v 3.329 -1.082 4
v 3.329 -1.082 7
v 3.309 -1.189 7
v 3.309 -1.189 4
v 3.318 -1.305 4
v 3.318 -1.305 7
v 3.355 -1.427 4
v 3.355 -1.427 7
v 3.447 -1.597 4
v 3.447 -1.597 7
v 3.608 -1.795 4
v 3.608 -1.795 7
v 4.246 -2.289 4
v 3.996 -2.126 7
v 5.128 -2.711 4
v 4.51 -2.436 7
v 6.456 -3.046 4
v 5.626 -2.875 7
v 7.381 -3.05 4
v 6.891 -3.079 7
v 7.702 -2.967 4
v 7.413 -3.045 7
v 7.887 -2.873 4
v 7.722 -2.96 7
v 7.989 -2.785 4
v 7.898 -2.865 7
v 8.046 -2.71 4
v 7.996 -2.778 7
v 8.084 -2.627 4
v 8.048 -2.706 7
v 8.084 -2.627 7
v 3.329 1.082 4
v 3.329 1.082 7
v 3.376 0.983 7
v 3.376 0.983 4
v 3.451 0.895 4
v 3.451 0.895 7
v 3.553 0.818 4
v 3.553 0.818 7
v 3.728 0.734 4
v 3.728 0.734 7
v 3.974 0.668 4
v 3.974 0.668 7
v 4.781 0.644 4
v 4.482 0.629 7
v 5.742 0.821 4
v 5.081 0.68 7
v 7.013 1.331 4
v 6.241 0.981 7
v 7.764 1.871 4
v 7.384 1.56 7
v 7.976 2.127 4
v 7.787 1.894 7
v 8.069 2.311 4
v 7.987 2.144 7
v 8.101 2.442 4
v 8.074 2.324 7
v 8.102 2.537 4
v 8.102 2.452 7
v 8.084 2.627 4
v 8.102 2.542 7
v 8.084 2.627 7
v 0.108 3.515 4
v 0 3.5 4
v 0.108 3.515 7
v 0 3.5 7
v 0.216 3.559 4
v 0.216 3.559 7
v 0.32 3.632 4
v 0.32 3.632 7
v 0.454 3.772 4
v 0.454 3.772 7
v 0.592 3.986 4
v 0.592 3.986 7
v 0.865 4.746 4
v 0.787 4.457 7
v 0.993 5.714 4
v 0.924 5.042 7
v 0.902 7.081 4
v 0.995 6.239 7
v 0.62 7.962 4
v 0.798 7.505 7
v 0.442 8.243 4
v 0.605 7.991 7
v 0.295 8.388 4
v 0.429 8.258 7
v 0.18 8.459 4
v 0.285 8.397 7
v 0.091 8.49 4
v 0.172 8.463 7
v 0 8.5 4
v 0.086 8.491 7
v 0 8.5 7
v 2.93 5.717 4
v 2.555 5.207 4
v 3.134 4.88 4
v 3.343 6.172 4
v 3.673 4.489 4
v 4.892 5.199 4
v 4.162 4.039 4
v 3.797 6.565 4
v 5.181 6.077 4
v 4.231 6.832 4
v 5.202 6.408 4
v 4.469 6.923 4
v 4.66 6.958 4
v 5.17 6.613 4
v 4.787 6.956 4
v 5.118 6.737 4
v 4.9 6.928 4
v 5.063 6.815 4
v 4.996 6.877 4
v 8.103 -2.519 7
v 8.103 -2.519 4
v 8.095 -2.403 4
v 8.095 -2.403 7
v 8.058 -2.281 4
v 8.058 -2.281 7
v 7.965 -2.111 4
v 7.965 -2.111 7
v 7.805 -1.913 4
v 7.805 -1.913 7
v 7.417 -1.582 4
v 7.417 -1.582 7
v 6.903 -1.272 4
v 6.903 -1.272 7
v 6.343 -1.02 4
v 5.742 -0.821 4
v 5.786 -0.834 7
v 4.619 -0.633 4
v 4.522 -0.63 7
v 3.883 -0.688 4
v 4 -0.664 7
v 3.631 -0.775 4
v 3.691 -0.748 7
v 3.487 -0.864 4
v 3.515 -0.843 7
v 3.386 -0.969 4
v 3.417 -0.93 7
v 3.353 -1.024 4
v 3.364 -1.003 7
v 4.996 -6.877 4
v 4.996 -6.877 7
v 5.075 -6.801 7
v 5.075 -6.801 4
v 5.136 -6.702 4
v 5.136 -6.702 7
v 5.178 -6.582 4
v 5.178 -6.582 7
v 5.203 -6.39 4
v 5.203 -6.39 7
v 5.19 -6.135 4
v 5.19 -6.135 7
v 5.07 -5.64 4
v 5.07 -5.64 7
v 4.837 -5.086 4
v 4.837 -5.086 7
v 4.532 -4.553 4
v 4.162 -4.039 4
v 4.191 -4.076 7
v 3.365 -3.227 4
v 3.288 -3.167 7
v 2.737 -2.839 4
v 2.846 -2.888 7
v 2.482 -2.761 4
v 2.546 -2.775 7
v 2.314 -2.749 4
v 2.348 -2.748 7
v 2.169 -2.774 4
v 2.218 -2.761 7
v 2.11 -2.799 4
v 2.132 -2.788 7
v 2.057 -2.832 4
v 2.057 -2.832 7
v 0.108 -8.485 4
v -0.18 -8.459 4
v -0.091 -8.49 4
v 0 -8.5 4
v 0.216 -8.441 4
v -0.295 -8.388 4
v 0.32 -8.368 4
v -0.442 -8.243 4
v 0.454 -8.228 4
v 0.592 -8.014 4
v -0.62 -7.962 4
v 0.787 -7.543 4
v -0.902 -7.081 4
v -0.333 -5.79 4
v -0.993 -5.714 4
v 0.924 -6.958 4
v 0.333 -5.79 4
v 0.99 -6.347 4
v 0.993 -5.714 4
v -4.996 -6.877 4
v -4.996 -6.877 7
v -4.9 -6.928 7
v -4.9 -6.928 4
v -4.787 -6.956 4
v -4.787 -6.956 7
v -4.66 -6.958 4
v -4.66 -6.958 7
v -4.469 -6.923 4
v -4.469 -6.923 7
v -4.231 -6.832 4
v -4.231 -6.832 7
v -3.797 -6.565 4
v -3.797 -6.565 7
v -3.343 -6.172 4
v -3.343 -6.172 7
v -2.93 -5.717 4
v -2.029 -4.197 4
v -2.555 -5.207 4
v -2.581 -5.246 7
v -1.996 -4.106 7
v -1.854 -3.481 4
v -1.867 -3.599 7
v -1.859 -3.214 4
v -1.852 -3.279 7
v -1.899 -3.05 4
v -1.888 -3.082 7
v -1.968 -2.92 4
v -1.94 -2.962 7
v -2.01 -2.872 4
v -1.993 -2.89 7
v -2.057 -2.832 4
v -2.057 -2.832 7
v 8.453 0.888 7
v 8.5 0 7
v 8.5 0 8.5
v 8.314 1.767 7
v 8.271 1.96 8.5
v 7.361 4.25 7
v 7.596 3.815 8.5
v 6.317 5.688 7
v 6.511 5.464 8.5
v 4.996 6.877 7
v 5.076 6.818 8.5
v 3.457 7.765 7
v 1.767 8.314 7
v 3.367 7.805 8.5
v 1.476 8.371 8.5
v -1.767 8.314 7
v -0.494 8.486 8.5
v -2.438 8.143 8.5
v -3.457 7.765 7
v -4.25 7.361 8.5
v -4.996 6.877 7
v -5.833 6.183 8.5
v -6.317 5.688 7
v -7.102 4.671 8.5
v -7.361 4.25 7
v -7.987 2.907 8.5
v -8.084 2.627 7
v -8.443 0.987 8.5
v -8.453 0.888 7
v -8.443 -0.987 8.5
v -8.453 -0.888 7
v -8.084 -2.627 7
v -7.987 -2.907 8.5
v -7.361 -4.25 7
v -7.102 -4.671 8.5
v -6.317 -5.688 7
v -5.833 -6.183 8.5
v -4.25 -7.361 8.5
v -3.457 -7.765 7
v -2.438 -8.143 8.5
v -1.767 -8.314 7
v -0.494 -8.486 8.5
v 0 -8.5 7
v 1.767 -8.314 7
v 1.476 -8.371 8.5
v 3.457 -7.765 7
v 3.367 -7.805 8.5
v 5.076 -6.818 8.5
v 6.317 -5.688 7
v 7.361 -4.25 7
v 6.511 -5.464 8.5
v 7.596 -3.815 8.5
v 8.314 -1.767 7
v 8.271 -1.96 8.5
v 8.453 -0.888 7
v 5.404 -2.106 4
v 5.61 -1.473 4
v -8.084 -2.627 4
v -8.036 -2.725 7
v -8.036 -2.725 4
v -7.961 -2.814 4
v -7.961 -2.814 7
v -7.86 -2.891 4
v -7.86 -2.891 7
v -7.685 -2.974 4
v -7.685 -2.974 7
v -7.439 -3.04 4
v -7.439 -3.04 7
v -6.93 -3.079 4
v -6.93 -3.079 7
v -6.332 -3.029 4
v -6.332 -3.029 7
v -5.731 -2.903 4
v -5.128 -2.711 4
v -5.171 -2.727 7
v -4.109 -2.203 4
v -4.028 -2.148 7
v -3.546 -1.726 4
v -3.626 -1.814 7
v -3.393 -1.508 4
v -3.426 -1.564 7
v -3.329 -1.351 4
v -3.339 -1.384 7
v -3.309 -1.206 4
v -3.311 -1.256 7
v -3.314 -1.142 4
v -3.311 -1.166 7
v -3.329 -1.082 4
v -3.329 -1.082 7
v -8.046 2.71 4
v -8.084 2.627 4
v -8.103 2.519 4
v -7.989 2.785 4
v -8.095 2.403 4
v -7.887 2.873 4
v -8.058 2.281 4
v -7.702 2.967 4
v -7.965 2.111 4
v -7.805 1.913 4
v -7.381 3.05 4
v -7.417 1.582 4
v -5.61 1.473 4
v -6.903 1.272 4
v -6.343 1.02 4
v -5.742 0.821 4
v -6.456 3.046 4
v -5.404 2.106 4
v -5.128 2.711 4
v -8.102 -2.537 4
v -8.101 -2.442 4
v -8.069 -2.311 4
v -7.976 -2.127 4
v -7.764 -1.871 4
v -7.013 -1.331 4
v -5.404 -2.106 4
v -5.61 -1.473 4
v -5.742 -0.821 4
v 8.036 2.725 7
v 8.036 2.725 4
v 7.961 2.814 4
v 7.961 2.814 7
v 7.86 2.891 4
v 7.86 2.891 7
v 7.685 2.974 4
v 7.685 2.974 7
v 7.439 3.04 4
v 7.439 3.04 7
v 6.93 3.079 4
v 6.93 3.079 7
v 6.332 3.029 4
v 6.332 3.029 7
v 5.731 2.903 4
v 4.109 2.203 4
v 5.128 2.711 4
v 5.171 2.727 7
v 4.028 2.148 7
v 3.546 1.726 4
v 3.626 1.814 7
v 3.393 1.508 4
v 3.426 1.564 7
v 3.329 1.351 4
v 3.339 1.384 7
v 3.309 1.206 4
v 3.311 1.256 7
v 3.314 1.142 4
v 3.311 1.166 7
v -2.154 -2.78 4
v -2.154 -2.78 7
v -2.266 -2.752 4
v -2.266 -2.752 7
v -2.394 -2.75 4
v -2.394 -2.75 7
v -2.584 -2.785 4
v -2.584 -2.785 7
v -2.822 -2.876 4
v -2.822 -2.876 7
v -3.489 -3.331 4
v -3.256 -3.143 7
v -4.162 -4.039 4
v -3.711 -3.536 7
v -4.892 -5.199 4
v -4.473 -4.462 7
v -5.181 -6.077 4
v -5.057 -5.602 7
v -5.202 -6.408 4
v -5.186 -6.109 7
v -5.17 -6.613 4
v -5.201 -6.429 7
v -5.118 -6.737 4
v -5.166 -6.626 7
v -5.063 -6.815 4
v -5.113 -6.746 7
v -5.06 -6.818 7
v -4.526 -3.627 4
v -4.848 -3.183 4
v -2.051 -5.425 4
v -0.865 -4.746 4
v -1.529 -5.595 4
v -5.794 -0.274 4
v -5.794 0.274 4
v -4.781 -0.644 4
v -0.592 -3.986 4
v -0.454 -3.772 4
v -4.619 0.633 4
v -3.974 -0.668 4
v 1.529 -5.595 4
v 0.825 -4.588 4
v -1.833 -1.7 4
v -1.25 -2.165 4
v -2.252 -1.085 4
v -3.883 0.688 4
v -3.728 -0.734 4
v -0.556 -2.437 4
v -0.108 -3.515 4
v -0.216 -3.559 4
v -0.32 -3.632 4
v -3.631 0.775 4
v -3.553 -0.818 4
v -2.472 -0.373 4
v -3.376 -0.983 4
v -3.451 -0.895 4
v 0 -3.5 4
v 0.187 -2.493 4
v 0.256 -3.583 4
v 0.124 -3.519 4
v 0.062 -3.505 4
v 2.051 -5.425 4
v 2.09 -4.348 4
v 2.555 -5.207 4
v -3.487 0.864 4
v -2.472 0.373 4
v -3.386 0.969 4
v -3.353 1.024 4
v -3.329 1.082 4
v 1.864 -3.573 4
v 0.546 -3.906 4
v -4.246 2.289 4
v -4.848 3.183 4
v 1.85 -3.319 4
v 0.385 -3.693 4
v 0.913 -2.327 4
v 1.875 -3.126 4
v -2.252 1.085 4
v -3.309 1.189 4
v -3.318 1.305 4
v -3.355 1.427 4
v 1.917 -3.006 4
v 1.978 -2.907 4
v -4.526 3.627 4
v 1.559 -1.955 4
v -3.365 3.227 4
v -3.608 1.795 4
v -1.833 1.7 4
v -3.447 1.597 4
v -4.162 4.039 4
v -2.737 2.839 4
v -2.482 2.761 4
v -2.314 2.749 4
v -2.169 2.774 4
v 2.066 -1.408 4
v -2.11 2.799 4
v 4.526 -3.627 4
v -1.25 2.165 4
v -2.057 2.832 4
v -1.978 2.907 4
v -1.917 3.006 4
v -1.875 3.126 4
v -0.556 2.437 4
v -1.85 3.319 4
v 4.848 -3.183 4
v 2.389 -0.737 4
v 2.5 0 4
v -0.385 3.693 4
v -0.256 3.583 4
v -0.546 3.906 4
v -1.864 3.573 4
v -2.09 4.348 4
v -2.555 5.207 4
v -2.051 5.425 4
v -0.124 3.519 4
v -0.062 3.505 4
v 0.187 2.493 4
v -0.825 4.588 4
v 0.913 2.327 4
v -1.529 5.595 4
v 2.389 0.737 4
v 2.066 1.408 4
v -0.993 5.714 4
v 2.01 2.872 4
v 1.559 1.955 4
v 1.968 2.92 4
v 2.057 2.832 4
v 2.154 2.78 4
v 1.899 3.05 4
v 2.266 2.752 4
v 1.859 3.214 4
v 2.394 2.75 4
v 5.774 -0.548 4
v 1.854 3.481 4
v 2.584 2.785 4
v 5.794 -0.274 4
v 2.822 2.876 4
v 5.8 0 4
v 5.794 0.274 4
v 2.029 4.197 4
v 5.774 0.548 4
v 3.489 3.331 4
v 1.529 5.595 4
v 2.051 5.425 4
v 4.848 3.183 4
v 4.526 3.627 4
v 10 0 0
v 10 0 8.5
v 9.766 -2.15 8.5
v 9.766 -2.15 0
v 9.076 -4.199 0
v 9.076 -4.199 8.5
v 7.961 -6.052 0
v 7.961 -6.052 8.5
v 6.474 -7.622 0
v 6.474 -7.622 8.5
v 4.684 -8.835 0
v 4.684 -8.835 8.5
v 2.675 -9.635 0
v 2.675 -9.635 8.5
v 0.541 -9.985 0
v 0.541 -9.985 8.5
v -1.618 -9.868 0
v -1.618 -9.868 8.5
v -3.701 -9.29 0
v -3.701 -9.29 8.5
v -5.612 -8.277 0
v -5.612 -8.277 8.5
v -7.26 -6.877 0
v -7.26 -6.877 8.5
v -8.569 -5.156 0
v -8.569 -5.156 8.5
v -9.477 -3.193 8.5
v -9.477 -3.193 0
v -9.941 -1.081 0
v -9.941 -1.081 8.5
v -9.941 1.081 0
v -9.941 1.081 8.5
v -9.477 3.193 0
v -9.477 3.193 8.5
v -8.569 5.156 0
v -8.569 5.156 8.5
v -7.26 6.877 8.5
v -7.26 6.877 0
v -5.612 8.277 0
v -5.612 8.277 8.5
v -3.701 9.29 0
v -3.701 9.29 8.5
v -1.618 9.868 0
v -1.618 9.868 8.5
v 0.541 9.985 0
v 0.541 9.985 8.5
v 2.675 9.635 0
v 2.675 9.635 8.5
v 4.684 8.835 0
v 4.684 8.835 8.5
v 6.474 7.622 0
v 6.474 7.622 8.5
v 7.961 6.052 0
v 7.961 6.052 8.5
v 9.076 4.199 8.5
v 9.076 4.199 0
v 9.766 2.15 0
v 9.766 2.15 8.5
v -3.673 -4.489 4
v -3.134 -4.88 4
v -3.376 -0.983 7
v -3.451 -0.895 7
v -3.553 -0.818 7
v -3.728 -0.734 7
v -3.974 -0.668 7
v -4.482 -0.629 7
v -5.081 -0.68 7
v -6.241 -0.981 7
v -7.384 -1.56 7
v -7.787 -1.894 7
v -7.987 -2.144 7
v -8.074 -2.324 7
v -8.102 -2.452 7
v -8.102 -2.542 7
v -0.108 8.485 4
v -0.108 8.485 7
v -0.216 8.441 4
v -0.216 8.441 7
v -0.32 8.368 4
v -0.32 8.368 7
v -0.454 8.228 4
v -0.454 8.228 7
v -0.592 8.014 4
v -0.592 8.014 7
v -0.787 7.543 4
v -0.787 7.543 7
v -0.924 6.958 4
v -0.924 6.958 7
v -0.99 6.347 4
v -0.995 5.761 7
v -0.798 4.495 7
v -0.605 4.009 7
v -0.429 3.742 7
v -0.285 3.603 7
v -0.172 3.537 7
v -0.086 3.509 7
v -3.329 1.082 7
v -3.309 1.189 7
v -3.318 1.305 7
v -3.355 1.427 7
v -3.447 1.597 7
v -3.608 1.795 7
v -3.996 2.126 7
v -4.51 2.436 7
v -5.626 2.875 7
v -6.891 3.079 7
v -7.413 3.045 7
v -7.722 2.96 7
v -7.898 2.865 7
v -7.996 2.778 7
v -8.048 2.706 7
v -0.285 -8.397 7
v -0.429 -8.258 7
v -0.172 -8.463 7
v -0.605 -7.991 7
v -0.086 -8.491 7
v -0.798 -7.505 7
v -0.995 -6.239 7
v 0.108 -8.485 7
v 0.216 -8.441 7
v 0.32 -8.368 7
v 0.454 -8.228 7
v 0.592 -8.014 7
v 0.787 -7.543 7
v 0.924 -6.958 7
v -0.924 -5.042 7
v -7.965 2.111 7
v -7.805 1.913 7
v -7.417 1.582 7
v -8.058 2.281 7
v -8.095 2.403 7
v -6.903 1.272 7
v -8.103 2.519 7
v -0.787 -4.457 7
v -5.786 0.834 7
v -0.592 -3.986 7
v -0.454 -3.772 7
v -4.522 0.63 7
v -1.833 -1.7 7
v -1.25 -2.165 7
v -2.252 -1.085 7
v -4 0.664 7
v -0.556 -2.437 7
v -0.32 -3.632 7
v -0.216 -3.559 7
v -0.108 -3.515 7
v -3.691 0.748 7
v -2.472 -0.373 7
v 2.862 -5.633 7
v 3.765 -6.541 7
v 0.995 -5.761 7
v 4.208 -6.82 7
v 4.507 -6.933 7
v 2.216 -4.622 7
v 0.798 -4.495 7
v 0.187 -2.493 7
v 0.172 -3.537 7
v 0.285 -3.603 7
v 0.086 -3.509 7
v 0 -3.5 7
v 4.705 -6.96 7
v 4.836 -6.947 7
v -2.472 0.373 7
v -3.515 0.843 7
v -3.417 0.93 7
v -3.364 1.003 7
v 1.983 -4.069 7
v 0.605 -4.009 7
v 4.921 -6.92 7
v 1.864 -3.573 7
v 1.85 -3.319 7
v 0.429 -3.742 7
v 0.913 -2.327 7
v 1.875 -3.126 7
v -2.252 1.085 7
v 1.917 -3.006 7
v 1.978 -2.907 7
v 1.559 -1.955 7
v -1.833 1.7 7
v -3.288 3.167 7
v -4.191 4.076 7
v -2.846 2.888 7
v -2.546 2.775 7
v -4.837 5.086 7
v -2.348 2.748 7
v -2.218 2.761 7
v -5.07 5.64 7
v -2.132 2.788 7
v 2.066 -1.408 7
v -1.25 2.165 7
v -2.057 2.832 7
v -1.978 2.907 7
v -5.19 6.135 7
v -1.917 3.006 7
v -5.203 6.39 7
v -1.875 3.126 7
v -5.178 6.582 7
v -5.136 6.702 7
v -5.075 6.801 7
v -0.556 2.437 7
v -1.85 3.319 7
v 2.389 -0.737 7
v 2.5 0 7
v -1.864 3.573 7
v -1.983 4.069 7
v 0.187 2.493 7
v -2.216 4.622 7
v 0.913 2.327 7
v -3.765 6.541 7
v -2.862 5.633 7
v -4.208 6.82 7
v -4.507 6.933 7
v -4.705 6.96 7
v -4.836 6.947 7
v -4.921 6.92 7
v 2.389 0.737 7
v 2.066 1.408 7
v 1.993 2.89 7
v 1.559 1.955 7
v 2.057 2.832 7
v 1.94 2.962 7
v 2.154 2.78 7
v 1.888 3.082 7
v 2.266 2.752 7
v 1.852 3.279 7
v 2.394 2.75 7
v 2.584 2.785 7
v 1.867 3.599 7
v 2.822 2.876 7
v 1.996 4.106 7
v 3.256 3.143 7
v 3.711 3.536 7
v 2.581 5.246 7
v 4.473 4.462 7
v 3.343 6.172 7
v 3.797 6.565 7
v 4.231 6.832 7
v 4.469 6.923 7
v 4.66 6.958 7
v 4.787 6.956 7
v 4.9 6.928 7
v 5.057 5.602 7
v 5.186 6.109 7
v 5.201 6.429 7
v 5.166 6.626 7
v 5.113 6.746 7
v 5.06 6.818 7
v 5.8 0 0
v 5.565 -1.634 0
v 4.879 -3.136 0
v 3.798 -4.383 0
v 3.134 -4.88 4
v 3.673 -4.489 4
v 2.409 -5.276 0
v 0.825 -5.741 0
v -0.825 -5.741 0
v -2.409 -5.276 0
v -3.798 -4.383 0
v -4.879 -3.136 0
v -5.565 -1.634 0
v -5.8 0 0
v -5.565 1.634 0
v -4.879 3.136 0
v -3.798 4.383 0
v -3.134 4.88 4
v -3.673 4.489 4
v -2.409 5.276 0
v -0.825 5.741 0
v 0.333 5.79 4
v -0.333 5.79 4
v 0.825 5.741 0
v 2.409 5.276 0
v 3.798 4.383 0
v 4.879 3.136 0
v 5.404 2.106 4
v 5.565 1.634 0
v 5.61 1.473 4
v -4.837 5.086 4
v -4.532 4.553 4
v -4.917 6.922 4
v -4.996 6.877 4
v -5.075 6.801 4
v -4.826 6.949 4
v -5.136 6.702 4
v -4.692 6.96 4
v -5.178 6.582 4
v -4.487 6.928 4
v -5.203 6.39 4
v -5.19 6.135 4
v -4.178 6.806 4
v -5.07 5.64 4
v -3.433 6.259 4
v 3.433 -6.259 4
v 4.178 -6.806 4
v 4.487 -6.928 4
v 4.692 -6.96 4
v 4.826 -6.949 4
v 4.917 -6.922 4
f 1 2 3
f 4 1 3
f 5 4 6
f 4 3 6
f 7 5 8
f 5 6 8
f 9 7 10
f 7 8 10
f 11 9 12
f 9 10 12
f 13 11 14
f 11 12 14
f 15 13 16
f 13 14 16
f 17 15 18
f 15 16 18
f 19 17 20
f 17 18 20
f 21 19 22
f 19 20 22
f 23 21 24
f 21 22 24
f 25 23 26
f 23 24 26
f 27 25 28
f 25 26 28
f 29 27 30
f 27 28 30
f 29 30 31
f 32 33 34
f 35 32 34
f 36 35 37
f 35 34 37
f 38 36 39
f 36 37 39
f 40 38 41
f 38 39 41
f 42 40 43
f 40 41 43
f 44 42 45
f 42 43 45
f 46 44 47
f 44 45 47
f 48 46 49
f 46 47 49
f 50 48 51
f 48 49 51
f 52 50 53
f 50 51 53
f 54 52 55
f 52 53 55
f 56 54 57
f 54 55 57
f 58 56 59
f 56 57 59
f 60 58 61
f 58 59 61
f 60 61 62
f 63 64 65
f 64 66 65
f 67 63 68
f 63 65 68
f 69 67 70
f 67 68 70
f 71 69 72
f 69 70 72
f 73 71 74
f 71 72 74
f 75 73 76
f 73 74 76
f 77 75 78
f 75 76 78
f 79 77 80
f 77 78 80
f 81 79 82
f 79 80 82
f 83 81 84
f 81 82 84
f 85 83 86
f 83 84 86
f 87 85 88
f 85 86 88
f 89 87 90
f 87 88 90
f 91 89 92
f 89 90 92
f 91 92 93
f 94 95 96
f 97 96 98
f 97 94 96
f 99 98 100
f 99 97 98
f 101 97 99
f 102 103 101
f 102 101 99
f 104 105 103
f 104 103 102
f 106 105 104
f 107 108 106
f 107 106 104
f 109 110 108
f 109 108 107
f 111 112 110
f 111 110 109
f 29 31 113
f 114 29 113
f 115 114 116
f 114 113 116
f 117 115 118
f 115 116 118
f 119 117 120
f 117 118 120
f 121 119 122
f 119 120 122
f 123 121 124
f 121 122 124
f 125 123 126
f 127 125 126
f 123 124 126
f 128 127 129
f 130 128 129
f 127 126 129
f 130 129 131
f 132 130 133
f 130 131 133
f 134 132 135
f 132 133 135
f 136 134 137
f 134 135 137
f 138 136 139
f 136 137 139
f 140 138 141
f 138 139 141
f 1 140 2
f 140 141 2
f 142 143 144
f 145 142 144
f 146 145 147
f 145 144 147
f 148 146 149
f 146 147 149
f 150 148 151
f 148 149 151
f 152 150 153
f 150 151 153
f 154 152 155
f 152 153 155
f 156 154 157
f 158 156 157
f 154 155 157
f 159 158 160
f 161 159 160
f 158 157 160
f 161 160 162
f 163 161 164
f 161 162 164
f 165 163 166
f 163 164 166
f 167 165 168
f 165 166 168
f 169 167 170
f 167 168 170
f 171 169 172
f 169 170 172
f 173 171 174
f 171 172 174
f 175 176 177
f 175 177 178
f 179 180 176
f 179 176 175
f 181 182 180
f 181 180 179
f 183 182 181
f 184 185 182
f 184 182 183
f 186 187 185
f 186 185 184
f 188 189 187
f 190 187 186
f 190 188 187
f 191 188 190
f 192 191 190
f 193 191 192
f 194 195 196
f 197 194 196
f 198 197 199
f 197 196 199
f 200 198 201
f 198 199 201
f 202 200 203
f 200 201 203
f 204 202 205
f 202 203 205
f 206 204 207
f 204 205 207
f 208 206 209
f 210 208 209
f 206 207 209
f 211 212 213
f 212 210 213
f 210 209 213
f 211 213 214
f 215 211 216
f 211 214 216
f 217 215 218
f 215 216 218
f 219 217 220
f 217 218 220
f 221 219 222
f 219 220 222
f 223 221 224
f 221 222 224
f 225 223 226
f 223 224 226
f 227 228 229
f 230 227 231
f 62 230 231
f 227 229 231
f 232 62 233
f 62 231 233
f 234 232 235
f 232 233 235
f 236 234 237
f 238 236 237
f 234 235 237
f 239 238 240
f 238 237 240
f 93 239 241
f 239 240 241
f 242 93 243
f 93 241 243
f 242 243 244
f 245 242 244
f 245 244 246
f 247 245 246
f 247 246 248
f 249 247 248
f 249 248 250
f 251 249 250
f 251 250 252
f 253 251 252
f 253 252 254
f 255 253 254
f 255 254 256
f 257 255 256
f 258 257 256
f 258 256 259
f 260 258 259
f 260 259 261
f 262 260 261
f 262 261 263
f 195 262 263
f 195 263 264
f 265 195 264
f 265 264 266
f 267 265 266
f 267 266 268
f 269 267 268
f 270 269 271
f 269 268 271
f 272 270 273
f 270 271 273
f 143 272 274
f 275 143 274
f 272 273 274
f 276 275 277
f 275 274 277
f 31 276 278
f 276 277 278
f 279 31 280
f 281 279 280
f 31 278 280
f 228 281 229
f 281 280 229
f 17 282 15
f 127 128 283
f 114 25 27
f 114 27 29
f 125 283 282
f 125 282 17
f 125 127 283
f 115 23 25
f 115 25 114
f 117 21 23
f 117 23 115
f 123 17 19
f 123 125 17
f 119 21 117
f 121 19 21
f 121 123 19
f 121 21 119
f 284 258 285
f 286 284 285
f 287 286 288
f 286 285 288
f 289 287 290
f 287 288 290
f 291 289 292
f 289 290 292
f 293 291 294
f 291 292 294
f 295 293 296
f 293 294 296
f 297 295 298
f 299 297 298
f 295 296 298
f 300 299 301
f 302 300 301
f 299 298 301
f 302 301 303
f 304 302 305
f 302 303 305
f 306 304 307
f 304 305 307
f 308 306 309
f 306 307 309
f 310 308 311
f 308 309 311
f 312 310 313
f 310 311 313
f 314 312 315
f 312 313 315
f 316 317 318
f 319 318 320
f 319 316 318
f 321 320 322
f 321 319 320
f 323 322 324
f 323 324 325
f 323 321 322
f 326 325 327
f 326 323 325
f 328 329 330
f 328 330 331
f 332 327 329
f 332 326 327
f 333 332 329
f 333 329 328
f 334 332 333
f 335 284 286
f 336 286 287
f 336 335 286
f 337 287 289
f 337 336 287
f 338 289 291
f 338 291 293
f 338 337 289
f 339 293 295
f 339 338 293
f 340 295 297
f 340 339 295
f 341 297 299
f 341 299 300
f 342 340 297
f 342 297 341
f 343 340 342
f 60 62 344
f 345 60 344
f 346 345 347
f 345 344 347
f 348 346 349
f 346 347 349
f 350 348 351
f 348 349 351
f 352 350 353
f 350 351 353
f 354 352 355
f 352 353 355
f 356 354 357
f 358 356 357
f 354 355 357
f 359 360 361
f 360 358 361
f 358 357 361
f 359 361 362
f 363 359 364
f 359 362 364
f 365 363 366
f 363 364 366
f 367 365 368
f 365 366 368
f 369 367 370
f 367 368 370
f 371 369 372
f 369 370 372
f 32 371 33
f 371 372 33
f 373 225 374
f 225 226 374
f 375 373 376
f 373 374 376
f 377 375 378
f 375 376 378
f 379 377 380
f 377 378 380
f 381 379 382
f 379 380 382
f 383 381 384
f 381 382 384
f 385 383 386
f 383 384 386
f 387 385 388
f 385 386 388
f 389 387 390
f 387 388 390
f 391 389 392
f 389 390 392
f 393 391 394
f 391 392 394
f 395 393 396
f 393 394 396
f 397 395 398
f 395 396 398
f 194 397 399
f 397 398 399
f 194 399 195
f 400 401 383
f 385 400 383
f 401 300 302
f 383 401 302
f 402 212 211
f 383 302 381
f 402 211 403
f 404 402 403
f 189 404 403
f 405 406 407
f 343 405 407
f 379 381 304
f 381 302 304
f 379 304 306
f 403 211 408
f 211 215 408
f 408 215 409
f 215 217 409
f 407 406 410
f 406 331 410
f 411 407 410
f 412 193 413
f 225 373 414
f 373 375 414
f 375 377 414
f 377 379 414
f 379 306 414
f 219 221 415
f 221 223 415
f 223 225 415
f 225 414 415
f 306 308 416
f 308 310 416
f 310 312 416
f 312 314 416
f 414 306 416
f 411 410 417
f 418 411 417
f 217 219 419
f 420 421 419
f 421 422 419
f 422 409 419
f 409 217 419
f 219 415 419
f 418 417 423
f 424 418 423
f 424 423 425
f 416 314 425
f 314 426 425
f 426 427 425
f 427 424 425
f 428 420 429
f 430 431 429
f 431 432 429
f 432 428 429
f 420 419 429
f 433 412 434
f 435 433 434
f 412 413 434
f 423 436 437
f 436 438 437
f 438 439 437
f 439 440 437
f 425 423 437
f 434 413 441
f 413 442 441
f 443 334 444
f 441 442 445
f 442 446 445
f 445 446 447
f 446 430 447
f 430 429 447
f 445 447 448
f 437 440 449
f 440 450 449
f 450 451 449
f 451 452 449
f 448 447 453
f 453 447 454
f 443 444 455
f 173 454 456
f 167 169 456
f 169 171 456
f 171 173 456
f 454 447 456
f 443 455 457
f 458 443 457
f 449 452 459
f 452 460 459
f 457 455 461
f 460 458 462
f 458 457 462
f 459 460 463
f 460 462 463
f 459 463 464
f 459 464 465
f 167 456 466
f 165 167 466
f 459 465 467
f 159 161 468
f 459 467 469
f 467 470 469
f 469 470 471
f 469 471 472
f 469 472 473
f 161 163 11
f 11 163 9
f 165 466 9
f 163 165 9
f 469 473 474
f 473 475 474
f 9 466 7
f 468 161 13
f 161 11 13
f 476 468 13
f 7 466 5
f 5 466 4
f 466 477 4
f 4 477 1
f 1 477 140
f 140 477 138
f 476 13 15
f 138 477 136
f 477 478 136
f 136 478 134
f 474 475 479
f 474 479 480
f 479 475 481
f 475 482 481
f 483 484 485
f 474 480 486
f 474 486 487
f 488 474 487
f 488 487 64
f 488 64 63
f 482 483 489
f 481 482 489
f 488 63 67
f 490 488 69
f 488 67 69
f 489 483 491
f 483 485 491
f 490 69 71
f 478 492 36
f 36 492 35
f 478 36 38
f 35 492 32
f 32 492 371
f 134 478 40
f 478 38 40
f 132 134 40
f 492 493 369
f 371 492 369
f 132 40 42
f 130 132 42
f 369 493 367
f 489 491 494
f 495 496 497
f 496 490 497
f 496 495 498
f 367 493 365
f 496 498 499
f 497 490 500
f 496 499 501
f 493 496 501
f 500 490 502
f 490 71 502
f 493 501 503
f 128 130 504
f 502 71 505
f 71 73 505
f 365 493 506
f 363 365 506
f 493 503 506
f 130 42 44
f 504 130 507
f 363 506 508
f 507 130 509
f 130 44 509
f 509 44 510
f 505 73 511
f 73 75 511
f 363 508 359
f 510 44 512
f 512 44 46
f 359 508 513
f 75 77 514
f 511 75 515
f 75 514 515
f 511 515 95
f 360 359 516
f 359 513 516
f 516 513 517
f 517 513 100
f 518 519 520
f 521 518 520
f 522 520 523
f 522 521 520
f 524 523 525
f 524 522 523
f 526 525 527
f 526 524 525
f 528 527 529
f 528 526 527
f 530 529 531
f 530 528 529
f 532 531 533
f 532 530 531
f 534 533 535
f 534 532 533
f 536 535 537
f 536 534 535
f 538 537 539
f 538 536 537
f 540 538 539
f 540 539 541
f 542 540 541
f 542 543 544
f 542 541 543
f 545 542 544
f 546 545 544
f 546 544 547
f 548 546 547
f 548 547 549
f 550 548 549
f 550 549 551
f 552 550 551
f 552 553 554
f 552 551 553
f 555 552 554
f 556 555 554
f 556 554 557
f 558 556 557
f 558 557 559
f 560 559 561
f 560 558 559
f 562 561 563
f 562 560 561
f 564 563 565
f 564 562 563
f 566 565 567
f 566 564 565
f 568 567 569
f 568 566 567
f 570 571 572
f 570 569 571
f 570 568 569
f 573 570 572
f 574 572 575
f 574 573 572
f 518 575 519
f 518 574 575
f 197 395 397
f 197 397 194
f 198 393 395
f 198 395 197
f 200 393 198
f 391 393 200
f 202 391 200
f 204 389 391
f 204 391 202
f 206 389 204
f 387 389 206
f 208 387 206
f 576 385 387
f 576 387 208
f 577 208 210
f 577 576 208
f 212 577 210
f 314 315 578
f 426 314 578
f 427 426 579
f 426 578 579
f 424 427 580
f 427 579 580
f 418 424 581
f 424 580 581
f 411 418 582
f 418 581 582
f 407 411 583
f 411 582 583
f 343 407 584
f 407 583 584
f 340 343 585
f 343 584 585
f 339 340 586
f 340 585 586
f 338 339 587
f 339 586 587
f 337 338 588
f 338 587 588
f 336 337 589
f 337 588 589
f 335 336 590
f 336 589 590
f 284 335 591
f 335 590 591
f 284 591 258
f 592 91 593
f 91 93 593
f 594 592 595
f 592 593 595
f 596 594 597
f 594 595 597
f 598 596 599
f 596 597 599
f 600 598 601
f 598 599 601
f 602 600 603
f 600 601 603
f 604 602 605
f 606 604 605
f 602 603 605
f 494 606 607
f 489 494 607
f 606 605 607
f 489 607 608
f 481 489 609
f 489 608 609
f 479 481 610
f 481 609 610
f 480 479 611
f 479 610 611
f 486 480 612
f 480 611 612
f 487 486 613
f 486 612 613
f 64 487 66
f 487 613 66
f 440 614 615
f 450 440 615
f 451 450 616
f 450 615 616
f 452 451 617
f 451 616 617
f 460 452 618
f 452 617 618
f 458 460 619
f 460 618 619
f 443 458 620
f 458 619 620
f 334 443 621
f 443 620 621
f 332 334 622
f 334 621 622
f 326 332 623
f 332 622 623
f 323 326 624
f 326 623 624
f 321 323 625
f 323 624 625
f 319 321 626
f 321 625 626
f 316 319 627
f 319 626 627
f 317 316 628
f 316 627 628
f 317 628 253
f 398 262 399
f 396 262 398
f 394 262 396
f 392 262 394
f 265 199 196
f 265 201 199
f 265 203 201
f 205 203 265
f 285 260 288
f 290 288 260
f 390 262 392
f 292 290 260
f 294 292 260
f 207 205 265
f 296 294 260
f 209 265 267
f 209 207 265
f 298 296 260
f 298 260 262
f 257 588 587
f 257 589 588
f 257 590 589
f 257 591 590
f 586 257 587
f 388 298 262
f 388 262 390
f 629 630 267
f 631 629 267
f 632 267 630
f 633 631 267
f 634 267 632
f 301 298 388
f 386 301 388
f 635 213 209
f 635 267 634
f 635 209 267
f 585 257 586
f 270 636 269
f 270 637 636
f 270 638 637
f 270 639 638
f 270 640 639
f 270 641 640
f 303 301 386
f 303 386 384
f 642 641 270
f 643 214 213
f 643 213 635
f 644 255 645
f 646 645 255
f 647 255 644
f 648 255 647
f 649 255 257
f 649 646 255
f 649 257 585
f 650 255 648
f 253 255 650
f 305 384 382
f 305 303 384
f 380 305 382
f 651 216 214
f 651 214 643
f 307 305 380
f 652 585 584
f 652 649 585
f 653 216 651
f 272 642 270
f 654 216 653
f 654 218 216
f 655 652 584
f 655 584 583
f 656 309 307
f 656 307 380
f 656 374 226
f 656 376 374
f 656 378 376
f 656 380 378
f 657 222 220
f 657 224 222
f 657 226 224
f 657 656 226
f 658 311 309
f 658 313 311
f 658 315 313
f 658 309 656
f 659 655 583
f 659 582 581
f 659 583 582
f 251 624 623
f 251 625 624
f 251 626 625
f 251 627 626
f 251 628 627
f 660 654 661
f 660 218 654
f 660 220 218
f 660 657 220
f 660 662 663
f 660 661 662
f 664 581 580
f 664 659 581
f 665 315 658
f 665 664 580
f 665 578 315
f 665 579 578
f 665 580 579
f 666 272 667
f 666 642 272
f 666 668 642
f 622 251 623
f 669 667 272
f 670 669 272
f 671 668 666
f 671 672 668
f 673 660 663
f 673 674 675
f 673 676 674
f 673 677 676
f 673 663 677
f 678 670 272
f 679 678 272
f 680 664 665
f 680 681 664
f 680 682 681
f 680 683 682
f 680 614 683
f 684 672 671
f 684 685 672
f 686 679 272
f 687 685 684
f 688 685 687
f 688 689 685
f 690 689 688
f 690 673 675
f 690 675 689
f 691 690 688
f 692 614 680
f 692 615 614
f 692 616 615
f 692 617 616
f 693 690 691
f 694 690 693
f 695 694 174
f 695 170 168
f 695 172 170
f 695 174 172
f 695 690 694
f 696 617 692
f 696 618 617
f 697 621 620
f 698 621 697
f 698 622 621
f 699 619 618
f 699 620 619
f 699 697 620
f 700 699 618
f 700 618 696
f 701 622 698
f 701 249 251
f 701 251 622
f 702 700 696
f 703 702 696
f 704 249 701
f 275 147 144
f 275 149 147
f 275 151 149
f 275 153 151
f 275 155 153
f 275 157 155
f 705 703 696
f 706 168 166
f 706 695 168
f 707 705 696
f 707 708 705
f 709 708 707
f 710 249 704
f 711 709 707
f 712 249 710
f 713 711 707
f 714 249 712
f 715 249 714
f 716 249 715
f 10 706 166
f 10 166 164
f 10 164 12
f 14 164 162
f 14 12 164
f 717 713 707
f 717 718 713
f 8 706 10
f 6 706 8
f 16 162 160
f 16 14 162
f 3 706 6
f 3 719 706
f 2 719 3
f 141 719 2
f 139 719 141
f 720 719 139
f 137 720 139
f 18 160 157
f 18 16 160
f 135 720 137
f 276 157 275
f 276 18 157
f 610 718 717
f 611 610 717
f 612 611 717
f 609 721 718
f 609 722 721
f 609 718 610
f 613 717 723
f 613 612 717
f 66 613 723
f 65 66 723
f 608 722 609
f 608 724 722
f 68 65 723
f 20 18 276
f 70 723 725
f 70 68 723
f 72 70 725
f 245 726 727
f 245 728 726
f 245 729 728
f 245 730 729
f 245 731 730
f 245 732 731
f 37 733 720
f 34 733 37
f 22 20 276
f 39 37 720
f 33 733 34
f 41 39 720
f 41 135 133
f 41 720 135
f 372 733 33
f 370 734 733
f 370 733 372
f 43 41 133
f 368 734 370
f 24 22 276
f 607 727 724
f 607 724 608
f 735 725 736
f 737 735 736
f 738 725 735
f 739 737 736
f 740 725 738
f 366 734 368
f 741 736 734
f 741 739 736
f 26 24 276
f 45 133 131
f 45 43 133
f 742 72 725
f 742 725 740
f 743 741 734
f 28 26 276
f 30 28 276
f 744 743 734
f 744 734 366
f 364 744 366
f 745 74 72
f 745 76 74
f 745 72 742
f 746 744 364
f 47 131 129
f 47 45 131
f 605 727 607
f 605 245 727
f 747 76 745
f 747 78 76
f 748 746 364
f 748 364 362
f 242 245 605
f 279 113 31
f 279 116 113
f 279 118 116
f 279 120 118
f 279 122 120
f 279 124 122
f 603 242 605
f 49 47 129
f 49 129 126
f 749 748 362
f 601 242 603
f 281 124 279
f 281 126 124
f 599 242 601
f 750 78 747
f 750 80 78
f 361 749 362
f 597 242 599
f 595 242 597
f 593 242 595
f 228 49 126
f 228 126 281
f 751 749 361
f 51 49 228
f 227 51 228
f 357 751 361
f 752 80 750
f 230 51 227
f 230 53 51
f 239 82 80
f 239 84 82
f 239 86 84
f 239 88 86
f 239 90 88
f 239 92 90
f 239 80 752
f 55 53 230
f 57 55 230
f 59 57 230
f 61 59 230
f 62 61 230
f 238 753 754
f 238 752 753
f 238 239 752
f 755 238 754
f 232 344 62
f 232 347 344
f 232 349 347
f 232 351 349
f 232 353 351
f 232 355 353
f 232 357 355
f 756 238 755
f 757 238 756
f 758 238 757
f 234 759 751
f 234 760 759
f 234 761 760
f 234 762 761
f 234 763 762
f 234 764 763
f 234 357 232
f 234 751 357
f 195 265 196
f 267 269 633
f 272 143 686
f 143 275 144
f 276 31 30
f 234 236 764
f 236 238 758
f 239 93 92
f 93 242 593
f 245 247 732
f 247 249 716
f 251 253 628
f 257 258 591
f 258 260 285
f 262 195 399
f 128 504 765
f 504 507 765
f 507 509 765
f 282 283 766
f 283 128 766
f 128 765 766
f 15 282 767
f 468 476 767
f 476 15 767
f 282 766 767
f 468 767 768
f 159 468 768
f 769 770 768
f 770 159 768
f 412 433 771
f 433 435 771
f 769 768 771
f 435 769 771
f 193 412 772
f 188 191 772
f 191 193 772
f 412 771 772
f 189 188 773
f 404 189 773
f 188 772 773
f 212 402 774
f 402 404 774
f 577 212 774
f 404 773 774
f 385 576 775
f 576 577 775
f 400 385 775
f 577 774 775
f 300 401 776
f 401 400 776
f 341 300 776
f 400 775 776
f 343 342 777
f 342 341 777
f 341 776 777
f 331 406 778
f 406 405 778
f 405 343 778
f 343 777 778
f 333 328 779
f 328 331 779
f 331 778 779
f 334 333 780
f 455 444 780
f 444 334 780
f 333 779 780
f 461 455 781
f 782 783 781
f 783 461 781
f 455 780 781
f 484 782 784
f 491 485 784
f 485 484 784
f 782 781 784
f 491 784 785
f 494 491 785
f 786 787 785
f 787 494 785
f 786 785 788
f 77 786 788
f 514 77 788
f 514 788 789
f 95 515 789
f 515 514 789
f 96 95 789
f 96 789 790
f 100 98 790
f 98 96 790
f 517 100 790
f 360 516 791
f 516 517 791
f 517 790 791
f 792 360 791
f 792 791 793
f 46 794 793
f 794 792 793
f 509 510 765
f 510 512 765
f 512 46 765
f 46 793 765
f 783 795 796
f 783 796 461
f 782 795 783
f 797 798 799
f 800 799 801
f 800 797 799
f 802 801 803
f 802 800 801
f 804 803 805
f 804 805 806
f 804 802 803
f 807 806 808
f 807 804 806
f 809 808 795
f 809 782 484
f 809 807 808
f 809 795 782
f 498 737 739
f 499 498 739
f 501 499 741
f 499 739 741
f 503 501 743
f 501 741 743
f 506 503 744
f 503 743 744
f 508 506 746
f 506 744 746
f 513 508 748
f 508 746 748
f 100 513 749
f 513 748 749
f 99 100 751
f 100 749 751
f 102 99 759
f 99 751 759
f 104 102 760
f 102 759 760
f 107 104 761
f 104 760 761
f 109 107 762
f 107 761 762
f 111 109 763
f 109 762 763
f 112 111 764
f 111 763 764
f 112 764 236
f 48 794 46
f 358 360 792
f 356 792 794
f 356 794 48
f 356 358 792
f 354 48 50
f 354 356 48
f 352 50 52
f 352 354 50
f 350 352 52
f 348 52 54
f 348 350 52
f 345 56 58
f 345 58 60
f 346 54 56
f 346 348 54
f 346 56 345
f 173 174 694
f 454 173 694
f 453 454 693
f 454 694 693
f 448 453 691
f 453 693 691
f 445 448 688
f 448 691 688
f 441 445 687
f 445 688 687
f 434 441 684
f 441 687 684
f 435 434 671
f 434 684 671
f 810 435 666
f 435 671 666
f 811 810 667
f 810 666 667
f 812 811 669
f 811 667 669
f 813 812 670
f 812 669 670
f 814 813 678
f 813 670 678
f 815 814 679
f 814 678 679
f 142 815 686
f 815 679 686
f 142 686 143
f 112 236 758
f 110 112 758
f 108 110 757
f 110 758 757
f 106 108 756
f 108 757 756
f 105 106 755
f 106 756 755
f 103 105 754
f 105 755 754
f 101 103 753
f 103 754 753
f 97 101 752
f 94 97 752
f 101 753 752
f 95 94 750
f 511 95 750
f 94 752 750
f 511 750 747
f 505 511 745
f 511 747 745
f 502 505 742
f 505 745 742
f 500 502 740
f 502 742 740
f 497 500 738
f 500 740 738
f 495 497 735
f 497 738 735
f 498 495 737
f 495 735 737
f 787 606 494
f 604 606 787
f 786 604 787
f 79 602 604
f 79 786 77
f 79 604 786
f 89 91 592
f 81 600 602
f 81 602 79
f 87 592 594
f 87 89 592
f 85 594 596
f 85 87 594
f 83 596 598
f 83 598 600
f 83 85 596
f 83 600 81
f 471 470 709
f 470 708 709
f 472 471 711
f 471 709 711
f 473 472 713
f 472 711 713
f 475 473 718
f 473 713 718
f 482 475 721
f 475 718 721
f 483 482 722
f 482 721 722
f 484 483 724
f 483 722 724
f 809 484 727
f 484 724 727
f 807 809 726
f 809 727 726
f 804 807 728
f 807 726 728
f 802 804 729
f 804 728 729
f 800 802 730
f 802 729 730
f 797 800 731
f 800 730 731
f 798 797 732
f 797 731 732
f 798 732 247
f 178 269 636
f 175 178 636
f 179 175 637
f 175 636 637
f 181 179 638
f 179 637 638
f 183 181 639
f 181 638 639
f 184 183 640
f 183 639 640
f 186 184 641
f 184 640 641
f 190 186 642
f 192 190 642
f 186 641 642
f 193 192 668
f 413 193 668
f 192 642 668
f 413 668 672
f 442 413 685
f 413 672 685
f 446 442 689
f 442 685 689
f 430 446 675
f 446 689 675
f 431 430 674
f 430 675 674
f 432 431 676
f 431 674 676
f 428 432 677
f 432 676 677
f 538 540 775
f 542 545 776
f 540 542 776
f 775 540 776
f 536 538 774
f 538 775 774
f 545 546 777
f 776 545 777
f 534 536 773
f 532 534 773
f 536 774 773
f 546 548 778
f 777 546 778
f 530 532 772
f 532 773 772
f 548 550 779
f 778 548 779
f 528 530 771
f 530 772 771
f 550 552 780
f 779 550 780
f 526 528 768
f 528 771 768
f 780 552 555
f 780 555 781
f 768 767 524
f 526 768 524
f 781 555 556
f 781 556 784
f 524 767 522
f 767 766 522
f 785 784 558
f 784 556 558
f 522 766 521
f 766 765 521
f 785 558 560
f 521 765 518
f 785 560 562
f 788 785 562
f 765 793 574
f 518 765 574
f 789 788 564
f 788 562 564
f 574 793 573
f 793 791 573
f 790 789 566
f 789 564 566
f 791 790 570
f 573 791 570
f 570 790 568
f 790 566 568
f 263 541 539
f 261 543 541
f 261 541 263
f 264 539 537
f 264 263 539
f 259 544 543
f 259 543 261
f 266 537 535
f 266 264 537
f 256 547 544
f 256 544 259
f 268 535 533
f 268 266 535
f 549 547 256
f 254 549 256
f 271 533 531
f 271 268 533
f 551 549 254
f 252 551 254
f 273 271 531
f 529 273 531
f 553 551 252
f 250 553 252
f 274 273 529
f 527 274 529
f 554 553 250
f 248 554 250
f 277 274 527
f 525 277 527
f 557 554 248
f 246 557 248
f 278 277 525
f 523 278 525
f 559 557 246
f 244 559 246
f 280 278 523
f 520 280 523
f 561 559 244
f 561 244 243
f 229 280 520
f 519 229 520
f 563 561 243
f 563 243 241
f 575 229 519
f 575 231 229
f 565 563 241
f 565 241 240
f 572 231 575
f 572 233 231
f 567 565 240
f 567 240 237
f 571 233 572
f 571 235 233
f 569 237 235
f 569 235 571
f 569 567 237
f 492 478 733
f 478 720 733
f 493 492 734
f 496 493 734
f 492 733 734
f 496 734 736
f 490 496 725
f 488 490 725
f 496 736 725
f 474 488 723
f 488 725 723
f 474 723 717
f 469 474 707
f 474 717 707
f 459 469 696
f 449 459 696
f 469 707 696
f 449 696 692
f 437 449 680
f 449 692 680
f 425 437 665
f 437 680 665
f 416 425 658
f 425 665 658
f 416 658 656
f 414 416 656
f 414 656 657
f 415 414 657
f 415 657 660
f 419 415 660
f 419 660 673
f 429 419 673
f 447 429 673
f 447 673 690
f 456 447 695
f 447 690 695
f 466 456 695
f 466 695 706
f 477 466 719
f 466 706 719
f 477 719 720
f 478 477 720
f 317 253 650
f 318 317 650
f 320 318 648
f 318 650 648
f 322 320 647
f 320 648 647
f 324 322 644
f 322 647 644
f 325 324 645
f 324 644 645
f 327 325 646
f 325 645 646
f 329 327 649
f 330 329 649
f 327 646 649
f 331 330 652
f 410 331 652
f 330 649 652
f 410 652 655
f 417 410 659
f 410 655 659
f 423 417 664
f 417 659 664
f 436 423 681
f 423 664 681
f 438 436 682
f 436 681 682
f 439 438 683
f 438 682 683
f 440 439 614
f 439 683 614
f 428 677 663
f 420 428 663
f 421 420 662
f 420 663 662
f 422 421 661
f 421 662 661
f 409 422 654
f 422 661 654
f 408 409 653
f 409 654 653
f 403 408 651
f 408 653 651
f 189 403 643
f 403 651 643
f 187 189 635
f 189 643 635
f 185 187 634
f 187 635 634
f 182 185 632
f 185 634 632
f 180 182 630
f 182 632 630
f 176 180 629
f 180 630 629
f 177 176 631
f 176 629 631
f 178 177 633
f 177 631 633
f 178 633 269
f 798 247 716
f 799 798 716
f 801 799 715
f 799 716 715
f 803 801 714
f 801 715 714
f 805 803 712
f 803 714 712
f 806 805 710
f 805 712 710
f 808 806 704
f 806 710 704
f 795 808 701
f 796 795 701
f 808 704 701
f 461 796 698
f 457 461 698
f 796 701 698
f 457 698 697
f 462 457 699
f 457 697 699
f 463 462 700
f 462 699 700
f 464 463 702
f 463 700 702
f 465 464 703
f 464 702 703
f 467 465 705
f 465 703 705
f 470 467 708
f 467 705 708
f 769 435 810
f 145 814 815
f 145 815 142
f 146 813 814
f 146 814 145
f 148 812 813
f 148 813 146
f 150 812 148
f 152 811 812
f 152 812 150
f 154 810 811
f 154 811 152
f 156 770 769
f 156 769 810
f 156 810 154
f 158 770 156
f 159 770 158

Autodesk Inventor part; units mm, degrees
ref_plane "YZ Plane" through (0, 0, 0) normal (1, 0, 0) x (0, 1, 0)
ref_plane "XZ Plane" through (0, 0, 0) normal (0, 1, 0) x (-1, 0, 0)
ref_plane "XY Plane" through (0, 0, 0) normal (0, 0, 1) x (1, 0, 0)
sketch "スケッチ1" plane through (0, 0, 0) normal (0, 0, 1) x (1, 0, 0)
  circle A0 centre (0, 0) radius 10
  circle A1 centre (0, 0) radius 5.8
  dimension "d0" = 20
  dimension "d1" = 11.6
extrude "押し出し1" add sketch "スケッチ1" along normal blind 8.5 contours A0 | A1
extrude "押し出し2" cut sketch "スケッチ1" along normal blind 4 contours A1
sketch "スケッチ2" plane through (0, 0, 8.5) normal (0, 0, 1) x (1, 0, 0)
  circle A0 centre (0, 0) radius 6 construction
  ellipse E0 centre (0, 6) end of major axis (0, 3.5) minor radius 1
  ellipse E1 centre (-3.5267, 4.8541) end of major axis (-2.0572, 2.8316) minor radius 1
  circle A1 centre (0, 0) radius 6 construction
  ellipse E2 centre (-5.7063, 1.8541) end of major axis (-3.3287, 1.0816) minor radius 1
  circle A2 centre (0, 0) radius 6 construction
  ellipse E3 centre (-5.7063, -1.8541) end of major axis (-3.3287, -1.0816) minor radius 1
  circle A3 centre (0, 0) radius 6 construction
  ellipse E4 centre (-3.5267, -4.8541) end of major axis (-2.0572, -2.8316) minor radius 1
  circle A4 centre (0, 0) radius 6 construction
  ellipse E5 centre (0, -6) end of major axis (0, -3.5) minor radius 1
  circle A5 centre (0, 0) radius 6 construction
  ellipse E6 centre (3.5267, -4.8541) end of major axis (2.0572, -2.8316) minor radius 1
  circle A6 centre (0, 0) radius 6 construction
  ellipse E7 centre (5.7063, -1.8541) end of major axis (3.3287, -1.0816) minor radius 1
  circle A7 centre (0, 0) radius 6 construction
  ellipse E8 centre (5.7063, 1.8541) end of major axis (3.3287, 1.0816) minor radius 1
  circle A8 centre (0, 0) radius 6 construction
  ellipse E9 centre (3.5267, 4.8541) end of major axis (2.0572, 2.8316) minor radius 1
  circle A9 centre (0, 0) radius 6 construction
  circle A10 centre (0, 0) radius 2.5
  circle A11 centre (0, 0) radius 8.5
  dimension "d9" = 1
  dimension "d10" = 2.5
  dimension "d6" = 12
  dimension "d7" = 6
  dimension "d8" = 0
  dimension "d13" = 360
  dimension "d15" = 5
  dimension "d16" = 17
extrude "押し出し3" cut sketch "スケッチ2" against normal blind 4.5 contours E0 | E1 | E2 | E3 | E4 | E5 | E6 | E7 | E8 | E9 | A10
extrude "押し出し4" cut sketch "スケッチ2" against normal blind 1.5
sketch "表" plane through (0, 0, 8.5) normal (0, 0, 1) x (1, 0, 0)
  circle A0 centre (0, 0) radius 2.5 projected
  arc A1 (4.9962, 6.8766) -> (0, 8.5) centre (0, 0) ccw projected
  ellipse E0 centre (0, 6) end of major axis (0, 8.5) minor radius 1 projected
  arc A2 (0, 8.5) -> (-4.9962, 6.8766) centre (0, 0) ccw projected
  ellipse E1 centre (-3.5267, 4.8541) end of major axis (-4.9962, 6.8766) minor radius 1 projected
  arc A3 (-4.9962, 6.8766) -> (-8.084, 2.6266) centre (0, 0) ccw projected
  ellipse E2 centre (-5.7063, 1.8541) end of major axis (-8.084, 2.6266) minor radius 1 projected
  arc A4 (-8.084, 2.6266) -> (-8.084, -2.6266) centre (0, 0) ccw projected
  ellipse E3 centre (-5.7063, -1.8541) end of major axis (-8.084, -2.6266) minor radius 1 projected
  arc A5 (-8.084, -2.6266) -> (-4.9962, -6.8766) centre (0, 0) ccw projected
  ellipse E4 centre (-3.5267, -4.8541) end of major axis (-4.9962, -6.8766) minor radius 1 projected
  arc A6 (-4.9962, -6.8766) -> (0, -8.5) centre (0, 0) ccw projected
  ellipse E5 centre (0, -6) end of major axis (0, -8.5) minor radius 1 projected
  arc A7 (0, -8.5) -> (4.9962, -6.8766) centre (0, 0) ccw projected
  ellipse E6 centre (3.5267, -4.8541) end of major axis (4.9962, -6.8766) minor radius 1 projected
  arc A8 (4.9962, -6.8766) -> (8.084, -2.6266) centre (0, 0) ccw projected
  ellipse E7 centre (5.7063, -1.8541) end of major axis (8.084, -2.6266) minor radius 1 projected
  arc A9 (8.084, -2.6266) -> (8.084, 2.6266) centre (0, 0) ccw projected
  ellipse E8 centre (5.7063, 1.8541) end of major axis (8.084, 2.6266) minor radius 1 projected
  arc A10 (8.084, 2.6266) -> (4.9962, 6.8766) centre (0, 0) ccw projected
  ellipse E9 centre (3.5267, 4.8541) end of major axis (4.9962, 6.8766) minor radius 1 projected
  circle A11 centre (0, 0) radius 10 projected
sketch "裏" plane through (0, 0, 0) normal (0, 0, -1) x (-1, 0, 0)
  circle A0 centre (0, 0) radius 5.8 projected
  circle A1 centre (0, 0) radius 10 projected
properties part number "Wheel"
